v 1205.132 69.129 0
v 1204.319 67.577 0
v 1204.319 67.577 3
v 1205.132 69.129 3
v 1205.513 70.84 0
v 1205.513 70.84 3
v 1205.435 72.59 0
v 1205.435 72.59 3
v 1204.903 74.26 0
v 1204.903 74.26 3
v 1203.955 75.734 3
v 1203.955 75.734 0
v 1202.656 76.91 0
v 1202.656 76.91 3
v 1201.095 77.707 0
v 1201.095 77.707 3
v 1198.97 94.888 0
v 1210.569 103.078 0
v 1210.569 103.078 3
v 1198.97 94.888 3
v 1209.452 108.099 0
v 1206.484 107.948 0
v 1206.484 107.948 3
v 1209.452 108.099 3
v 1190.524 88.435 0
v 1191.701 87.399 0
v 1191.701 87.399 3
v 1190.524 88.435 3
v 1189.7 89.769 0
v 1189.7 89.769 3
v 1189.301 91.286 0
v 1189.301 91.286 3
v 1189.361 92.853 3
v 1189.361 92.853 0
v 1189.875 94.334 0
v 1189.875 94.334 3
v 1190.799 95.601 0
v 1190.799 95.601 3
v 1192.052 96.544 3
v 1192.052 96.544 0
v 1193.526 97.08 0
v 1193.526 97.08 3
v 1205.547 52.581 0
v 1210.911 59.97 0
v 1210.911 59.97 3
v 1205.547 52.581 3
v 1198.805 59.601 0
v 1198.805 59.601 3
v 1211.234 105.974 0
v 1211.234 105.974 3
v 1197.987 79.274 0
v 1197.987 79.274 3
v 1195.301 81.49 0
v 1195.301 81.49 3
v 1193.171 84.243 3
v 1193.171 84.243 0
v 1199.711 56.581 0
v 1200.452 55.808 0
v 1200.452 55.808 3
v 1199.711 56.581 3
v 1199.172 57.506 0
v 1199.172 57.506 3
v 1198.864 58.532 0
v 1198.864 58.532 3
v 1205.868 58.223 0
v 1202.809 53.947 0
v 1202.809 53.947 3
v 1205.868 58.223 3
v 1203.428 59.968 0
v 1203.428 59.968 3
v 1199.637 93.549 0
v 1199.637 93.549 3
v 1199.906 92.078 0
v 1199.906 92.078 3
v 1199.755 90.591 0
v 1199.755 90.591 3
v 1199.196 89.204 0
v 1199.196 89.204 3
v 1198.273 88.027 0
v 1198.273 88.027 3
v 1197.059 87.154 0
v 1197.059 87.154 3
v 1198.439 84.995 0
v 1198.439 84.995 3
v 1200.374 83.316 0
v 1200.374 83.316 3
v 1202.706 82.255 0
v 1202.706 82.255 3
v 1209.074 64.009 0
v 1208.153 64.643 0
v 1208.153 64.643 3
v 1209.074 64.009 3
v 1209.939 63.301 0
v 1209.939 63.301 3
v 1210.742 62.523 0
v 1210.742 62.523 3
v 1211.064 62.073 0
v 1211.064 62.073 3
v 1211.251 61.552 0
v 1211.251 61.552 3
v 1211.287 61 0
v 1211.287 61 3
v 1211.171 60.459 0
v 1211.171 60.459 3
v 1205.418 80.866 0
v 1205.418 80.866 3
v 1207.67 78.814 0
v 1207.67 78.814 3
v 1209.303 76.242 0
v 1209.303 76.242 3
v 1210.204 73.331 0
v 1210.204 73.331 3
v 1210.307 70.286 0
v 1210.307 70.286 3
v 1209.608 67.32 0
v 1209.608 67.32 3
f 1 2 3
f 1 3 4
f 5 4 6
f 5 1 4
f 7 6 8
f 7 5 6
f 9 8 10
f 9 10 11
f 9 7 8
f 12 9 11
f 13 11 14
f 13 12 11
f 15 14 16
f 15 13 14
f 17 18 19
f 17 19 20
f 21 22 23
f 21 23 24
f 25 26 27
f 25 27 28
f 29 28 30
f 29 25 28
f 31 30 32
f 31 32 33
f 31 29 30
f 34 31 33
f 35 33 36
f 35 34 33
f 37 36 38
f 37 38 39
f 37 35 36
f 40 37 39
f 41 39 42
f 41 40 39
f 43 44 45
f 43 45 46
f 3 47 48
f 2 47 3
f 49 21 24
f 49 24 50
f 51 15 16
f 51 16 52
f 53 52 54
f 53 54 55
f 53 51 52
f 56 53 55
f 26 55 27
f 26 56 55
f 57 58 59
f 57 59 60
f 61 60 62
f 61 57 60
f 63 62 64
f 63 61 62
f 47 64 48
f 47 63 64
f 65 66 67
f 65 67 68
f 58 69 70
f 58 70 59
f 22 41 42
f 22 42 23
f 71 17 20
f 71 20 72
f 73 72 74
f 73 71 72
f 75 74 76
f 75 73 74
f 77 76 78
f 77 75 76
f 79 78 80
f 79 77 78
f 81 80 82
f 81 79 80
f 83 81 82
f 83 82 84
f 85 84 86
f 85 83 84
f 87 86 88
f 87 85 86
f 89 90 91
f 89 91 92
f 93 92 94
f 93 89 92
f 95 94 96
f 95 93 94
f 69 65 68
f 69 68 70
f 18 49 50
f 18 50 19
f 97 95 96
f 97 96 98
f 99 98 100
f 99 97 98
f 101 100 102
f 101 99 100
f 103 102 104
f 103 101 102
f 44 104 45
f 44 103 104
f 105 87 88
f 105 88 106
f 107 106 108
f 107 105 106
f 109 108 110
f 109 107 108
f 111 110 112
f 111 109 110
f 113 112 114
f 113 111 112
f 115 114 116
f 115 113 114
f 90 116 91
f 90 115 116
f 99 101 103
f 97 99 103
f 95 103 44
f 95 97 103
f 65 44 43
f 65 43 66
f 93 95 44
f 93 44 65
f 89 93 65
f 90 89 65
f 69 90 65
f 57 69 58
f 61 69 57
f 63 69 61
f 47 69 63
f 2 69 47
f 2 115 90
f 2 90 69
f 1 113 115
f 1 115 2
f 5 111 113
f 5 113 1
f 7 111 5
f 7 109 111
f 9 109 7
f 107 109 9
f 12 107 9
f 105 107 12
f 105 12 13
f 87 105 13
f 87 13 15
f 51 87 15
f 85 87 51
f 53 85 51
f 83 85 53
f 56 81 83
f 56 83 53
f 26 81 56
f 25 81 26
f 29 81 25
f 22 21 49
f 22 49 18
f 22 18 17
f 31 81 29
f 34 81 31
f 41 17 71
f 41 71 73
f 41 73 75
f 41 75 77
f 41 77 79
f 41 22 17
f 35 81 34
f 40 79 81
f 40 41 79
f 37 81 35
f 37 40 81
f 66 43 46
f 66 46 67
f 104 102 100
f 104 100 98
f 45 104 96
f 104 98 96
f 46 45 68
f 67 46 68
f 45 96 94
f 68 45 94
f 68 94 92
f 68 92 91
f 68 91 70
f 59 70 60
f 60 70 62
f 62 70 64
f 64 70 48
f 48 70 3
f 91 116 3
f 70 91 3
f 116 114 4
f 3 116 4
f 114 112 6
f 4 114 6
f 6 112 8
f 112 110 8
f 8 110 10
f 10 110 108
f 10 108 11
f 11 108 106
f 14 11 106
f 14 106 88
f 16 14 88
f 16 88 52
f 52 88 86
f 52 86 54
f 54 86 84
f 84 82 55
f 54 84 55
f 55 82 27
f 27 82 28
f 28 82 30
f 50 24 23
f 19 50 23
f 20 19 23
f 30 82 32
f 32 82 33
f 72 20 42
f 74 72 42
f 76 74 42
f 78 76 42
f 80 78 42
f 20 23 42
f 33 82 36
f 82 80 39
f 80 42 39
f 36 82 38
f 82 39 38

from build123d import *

# Parameters (mm, degrees)
BASE_EXTRUDE_DEPTH = 3


with BuildPart() as part:
    # Sketch1 → Base-Extrude (new body)
    with BuildSketch(Plane.XY):
        with BuildLine():
            Line((1209.451820501, 108.09887988), (1211.233559267, 105.974449758))
            Line((1211.233559267, 105.974449758), (1210.568605008, 103.078332754))
            Line((1210.568605008, 103.078332754), (1198.969787726, 94.887573091))
            ThreePointArc((1198.969787726, 94.887573091), (1199.754979333, 90.590746745), (1197.058986008, 87.154053204))
            ThreePointArc((1197.058986008, 87.154053204), (1199.345903518, 84.086132658), (1202.705960658, 82.255246482))
            ThreePointArc((1202.705960658, 82.255246482), (1209.850323306, 74.816142589), (1208.153154203, 64.64255908))
            ThreePointArc((1208.153154203, 64.64255908), (1209.513439683, 63.663584022), (1210.741786407, 62.523437946))
            ThreePointArc((1210.741786407, 62.523437946), (1211.288328706, 61.27741643), (1210.911264244, 59.970090727))
            Line((1210.911264244, 59.970090727), (1205.547364782, 52.580569169))
            Line((1205.547364782, 52.580569169), (1202.809005818, 53.947443229))
            Line((1202.809005818, 53.947443229), (1205.868102338, 58.222609567))
            Line((1205.868102338, 58.222609567), (1203.428362014, 59.968366467))
            Line((1203.428362014, 59.968366467), (1200.451593647, 55.808255846))
            ThreePointArc((1200.451593647, 55.808255846), (1199.171644978, 57.50635778), (1198.80528387, 59.601017254))
            Line((1198.80528387, 59.601017254), (1204.319471793, 67.576551504))
            ThreePointArc((1204.319471793, 67.576551504), (1205.223941879, 73.442636449), (1201.095098665, 77.706633686))
            ThreePointArc((1201.095098665, 77.706633686), (1195.300986917, 81.489736173), (1191.700510295, 87.399064684))
            ThreePointArc((1191.700510295, 87.399064684), (1189.361079278, 92.852732142), (1193.525678388, 97.080206622))
            Line((1193.525678388, 97.080206622), (1206.484161244, 107.948359455))
            Line((1206.484161244, 107.948359455), (1209.451820501, 108.09887988))
        make_face()
    extrude(amount=BASE_EXTRUDE_DEPTH)


solid = part.part
